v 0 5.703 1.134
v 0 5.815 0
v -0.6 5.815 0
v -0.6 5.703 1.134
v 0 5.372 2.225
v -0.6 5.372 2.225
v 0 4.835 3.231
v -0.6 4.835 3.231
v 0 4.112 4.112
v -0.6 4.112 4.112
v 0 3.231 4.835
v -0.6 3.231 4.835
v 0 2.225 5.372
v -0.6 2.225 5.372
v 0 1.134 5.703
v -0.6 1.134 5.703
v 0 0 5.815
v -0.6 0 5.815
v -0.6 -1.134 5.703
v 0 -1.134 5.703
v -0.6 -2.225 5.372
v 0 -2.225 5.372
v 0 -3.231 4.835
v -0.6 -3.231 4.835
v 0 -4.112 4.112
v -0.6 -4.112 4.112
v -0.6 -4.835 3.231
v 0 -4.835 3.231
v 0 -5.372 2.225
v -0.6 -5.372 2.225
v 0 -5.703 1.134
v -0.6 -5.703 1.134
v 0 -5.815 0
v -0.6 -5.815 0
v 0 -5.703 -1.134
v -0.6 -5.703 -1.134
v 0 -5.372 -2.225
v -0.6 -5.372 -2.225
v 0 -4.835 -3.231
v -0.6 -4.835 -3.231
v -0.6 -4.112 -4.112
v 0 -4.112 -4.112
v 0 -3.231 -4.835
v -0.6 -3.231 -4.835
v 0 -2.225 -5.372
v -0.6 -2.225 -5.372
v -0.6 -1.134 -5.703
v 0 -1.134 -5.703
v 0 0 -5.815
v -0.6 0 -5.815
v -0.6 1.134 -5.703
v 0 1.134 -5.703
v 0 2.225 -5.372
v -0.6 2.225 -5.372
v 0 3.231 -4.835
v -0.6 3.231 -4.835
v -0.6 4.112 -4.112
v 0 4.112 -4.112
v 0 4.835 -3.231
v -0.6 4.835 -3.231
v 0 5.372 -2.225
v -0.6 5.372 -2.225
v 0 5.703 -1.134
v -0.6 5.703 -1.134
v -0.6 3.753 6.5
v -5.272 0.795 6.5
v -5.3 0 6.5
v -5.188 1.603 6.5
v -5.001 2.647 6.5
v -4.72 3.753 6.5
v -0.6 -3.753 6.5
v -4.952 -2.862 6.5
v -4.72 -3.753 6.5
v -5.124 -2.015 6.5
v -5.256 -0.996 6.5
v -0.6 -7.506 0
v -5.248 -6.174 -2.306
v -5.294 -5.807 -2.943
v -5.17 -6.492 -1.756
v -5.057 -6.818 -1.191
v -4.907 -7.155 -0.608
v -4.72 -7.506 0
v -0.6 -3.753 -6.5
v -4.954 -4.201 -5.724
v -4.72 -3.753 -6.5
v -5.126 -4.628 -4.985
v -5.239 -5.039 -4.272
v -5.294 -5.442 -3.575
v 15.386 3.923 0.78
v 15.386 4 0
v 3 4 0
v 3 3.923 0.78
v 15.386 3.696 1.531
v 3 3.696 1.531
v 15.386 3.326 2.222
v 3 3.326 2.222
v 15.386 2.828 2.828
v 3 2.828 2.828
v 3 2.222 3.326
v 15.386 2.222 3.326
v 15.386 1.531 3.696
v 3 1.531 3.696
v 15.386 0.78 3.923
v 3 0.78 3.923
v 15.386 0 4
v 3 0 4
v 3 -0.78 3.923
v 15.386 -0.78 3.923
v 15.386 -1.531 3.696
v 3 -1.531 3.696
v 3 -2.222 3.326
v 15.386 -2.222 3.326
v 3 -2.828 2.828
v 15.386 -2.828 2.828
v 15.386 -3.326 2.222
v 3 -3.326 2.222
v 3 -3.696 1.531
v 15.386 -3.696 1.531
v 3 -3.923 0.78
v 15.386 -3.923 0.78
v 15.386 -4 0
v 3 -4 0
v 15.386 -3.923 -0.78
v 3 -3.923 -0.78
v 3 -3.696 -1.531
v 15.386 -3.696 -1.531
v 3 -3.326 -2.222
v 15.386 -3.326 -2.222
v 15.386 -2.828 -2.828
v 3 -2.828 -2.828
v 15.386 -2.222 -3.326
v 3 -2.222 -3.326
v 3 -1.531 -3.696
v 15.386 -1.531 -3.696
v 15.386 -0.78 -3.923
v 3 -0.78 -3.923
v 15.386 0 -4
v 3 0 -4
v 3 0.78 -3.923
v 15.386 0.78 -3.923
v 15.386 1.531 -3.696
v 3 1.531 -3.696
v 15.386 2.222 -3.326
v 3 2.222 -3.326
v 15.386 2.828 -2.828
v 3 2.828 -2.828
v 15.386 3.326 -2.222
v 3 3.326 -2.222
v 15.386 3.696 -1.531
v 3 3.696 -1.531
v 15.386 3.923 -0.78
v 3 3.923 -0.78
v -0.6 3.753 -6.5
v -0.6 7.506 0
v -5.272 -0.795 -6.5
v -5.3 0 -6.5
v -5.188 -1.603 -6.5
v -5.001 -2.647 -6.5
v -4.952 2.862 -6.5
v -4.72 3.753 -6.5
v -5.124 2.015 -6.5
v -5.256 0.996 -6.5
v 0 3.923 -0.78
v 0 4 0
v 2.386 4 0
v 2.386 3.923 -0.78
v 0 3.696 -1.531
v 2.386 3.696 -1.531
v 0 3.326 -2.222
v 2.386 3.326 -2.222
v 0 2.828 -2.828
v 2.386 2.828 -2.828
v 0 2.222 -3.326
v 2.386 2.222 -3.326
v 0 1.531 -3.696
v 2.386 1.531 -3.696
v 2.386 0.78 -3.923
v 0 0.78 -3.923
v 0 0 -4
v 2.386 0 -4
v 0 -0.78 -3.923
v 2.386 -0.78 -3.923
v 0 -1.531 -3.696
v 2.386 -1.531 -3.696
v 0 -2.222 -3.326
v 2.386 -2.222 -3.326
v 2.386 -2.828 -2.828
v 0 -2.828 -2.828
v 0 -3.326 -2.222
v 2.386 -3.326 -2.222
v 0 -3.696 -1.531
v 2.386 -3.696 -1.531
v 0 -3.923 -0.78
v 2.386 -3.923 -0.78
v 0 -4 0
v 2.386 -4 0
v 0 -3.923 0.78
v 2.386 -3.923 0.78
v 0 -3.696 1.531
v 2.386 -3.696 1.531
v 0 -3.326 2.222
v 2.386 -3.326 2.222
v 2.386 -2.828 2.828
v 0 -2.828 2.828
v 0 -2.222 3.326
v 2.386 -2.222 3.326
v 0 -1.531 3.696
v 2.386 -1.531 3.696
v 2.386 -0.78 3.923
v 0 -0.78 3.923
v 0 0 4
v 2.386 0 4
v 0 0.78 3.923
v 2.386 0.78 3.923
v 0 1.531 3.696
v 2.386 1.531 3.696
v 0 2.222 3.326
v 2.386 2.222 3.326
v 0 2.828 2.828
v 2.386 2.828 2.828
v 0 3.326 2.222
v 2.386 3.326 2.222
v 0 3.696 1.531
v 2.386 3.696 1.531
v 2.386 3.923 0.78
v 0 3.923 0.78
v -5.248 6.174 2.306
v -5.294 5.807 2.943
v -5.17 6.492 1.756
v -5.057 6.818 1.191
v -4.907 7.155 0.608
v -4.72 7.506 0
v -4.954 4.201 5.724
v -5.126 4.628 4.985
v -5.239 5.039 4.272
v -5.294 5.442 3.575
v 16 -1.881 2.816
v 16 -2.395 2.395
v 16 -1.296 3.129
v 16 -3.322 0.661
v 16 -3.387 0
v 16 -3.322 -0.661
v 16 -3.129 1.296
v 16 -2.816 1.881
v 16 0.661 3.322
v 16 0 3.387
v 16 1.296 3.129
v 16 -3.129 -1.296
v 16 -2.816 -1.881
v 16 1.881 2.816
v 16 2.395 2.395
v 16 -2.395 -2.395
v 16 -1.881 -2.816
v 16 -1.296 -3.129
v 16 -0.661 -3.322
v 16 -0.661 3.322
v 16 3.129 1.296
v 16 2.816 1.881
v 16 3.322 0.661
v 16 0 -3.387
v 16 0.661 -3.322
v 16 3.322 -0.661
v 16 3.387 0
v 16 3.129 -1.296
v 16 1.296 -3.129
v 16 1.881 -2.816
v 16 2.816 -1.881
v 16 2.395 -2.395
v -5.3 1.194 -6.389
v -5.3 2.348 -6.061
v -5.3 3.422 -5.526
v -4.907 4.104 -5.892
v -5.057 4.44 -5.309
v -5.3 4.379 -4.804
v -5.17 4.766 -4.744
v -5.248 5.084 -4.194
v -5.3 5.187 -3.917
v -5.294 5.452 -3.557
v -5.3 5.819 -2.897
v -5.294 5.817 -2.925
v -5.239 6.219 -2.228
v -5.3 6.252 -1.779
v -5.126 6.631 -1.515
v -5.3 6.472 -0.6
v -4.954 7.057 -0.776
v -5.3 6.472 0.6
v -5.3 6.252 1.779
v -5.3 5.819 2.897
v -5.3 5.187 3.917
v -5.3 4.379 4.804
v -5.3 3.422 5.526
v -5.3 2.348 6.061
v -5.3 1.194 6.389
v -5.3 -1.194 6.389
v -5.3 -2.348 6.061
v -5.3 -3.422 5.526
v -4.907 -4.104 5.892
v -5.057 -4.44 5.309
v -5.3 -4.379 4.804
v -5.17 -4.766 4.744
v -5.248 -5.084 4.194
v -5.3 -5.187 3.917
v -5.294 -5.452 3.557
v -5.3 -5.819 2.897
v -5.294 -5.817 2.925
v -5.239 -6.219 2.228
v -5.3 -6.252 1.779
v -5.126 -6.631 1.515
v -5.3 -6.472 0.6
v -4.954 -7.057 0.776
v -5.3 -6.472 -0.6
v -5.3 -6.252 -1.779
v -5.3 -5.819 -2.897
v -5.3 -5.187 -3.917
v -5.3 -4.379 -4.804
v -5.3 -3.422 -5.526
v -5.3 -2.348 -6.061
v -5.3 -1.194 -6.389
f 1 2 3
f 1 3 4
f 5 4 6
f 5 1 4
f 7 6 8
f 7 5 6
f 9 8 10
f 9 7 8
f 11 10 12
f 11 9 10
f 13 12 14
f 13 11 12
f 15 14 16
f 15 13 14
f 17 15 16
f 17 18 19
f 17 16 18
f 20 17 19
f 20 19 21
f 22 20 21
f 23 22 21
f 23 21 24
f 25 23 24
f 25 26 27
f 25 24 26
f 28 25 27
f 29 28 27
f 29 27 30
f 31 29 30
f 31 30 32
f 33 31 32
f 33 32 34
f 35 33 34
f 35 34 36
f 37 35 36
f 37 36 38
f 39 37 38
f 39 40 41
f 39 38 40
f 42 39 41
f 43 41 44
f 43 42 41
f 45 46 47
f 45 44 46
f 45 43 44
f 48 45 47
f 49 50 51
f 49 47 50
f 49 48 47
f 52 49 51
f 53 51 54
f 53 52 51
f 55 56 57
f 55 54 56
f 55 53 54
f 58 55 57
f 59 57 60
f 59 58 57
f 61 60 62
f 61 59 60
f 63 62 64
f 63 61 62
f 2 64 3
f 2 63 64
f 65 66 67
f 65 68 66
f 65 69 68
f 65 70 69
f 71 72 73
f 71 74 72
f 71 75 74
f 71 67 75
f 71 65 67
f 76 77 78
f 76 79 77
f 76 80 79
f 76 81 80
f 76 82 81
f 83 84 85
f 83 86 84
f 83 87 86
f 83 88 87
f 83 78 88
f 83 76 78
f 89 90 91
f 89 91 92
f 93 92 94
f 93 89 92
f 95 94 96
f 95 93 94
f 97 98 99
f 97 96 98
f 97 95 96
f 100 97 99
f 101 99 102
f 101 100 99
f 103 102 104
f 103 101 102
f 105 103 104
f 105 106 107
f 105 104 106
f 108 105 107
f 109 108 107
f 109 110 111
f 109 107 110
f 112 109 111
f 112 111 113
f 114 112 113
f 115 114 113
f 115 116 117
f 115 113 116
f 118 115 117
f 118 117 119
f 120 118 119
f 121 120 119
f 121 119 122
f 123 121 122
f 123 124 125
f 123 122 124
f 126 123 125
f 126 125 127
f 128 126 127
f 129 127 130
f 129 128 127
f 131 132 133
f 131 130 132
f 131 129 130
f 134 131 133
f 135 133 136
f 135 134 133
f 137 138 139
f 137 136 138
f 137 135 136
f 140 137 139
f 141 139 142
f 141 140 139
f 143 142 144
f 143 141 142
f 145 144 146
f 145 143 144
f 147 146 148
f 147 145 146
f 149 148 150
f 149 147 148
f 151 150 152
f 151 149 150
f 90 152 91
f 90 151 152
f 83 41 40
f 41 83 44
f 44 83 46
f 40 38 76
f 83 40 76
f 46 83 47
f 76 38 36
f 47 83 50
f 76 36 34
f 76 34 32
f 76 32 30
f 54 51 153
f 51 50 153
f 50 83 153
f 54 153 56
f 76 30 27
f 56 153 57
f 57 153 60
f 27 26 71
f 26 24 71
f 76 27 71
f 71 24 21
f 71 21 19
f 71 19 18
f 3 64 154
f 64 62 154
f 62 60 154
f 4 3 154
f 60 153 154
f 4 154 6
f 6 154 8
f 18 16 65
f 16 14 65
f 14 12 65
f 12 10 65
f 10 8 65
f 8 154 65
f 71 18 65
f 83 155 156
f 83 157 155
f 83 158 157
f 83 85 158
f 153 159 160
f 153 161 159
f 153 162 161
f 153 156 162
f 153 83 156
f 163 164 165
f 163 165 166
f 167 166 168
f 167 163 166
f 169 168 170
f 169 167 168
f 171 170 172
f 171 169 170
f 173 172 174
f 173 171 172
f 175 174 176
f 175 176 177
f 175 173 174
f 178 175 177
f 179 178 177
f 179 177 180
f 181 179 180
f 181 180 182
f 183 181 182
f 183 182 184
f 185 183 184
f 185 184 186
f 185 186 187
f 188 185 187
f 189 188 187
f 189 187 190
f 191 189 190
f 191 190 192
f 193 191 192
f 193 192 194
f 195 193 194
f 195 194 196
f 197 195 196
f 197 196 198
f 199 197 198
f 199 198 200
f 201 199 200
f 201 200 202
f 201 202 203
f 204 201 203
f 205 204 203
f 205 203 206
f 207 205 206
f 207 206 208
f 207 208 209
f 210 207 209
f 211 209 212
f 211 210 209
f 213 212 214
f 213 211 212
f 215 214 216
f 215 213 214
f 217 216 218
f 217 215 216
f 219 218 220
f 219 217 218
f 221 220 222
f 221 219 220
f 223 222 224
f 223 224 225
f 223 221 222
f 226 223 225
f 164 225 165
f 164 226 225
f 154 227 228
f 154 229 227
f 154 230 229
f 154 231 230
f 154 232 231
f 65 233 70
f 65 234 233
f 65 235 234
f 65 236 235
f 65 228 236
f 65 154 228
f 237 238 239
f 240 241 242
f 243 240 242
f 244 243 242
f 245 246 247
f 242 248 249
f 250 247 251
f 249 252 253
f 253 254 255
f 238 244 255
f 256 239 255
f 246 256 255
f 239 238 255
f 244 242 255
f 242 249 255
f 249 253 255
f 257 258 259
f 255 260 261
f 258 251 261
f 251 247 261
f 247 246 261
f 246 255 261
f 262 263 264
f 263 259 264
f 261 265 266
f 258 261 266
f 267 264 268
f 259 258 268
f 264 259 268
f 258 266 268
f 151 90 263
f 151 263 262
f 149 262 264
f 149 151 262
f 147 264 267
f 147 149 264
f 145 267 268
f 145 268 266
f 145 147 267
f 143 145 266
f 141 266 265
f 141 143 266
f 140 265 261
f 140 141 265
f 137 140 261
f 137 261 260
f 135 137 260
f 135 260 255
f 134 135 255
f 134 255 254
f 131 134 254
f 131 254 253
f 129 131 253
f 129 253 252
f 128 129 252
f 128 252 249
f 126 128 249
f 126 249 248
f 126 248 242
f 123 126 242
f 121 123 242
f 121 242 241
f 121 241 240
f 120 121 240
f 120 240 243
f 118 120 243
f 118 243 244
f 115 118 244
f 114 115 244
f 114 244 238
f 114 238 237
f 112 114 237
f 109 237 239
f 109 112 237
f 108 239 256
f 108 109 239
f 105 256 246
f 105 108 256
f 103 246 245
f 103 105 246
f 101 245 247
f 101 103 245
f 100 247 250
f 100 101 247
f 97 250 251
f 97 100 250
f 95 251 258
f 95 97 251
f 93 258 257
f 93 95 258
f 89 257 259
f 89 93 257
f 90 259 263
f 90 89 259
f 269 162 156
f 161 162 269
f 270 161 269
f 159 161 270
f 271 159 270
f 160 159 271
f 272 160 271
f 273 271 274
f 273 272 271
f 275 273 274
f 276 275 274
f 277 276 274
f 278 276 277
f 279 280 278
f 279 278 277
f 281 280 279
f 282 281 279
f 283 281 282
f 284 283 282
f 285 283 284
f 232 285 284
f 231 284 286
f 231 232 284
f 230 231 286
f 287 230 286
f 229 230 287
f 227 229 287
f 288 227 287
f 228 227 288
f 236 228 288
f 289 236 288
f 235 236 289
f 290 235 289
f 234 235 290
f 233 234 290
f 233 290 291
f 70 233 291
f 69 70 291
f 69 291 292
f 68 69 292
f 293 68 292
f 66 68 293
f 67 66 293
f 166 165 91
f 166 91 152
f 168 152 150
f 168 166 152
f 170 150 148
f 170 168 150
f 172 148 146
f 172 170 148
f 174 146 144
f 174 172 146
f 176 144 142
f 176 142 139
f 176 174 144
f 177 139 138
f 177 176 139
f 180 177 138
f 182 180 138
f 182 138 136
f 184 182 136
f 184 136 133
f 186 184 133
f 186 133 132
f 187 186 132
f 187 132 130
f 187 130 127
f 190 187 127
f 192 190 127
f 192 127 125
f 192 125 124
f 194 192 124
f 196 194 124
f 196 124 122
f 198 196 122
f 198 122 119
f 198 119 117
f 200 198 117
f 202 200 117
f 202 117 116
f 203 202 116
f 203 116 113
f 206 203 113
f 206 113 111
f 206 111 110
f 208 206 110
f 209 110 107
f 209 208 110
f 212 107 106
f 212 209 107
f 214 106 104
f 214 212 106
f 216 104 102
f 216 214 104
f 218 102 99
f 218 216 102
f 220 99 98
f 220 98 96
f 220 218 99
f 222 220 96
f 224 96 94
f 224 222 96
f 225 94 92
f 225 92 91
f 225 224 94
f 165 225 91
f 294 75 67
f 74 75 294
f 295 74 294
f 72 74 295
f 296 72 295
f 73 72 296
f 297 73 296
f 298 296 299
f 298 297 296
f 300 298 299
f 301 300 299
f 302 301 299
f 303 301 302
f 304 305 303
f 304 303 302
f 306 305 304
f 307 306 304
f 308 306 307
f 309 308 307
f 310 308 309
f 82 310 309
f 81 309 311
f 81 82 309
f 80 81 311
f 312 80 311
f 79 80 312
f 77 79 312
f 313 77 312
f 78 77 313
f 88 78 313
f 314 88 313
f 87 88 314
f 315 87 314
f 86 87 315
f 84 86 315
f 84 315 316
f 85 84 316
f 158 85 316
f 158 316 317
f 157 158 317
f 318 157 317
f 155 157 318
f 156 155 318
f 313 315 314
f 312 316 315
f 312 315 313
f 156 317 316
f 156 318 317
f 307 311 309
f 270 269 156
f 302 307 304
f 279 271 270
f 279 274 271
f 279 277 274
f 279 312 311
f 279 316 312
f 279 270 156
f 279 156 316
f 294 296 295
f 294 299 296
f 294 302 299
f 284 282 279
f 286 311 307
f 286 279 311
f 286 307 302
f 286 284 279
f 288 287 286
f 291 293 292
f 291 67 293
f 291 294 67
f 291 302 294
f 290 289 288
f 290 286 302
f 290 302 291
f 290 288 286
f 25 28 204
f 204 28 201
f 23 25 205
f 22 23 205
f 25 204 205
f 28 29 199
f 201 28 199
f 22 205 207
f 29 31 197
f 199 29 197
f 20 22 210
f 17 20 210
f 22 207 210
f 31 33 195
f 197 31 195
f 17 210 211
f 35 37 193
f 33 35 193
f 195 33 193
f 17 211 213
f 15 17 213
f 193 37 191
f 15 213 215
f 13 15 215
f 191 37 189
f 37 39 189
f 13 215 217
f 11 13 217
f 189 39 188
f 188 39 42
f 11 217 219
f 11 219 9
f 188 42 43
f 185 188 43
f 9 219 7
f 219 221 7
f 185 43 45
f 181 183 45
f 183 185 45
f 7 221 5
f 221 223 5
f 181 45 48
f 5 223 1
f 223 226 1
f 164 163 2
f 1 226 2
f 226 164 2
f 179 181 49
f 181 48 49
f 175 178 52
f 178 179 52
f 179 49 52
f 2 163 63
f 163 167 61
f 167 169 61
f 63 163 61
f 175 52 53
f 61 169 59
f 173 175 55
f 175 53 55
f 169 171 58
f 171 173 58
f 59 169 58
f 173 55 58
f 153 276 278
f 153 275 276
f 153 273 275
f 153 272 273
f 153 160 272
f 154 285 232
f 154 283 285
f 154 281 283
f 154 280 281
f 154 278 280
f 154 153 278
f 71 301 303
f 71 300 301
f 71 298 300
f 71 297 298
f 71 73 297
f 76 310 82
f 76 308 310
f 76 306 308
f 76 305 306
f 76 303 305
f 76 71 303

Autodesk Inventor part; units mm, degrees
ref_plane "YZ Plane" through (0, 0, 0) normal (1, 0, 0) x (0, 1, 0)
ref_plane "XZ Plane" through (0, 0, 0) normal (0, 1, 0) x (-1, 0, 0)
sketch "Sketch1" plane through (0, 0, 0) normal (0, 0, 1) x (1, 0, 0)
  line L0 (0, 5.815) -> (0, 4)
  line L1 (3, 4) -> (16, 4)
  line L2 (16, 4) -> (16, 0)
  line L3 (16, 0) -> (-0.6001, 0)
  line L4 (-3.9201, 0) -> (19.32, 0) projected
  line L5 (-0.6001, 0) -> (-0.6001, 5.815)
  line L6 (-0.6001, 5.815) -> (0, 5.815)
  line L7 (3, 4) -> (2.3865, 4)
  line L8 (2.3865, 4) -> (0, 4)
  line L9 (0, -1.163) -> (0, 6.978) projected
  dimension "d0" = 16
  dimension "d1" = 13
  dimension "d2" = 8
  dimension "d9" = 0.6001
  dimension "d10" = 11.63
  dimension "d13" = 0.6136
  dimension "d14" = 8
revolve "Body" add sketch "Sketch1" angle 360 about axis through (16, 0, 0) along (-1, 0, 0)
sketch "Sketch2" plane through (-0.6001, 0, 0) normal (-1, 0, 0) x (0, 0, 1)
  line L0 (0, 7.5056) -> (6.5, 3.7528)
  line L1 (6.5, 3.7528) -> (6.5, -3.7528)
  line L2 (6.5, -3.7528) -> (0, -7.5056)
  line L3 (0, -7.5056) -> (-6.5, -3.7528)
  line L4 (-6.5, -3.7528) -> (-6.5, 3.7528)
  line L5 (-6.5, 3.7528) -> (0, 7.5056)
  point P0 (0, 0)
  point P1 (0, 0)
  dimension "d11" = 13
extrude "Head" add sketch "Sketch2" along normal blind 4.7
sketch "Sketch4" plane through (0, 0, 0) normal (0, 0, 1) x (1, 0, 0)
  line L0 (-5.3001, 6.5) -> (-5.3001, 7.5056)
  line L1 (-5.3001, 7.5056) -> (-4.7195, 7.5056)
  line L2 (-4.7195, 7.5056) -> (-5.3001, 6.5)
  line L3 (-6.2401, 0) -> (0.3399, 0) projected
  line L4 (-0.6001, 7.5056) -> (-5.3001, 7.5056) projected
  line L5 (-5.3001, 3.7528) -> (-5.3001, 7.5056) projected
  dimension "d5" = 30
  dimension "d19" = 13
revolve "Chamfer1" cut sketch "Sketch4" angle 360 about axis through (-10, 0, 0) along (1, 0, 0)
thread "Thread" size "M8x1" class "6g" standard "ISO Metric profile" length 13
chamfer "Chamfer2" distance 0.6134 distance2 0.6136 1 edges at (16, -4, 0) measured on face at (16, -0.6859, -0.8072)
ref_plane "Work Plane1" through (1.525, 0, 0) normal (0, 0, 1) x (1, 0, 0)
equation "\"d0\" = NLG"
equation "\"d1\" = GEL"
equation "\"d2\" = GD"
equation "\"d10\" = SD2"
equation "\"d14\" = BDM"
equation "\"d11\" = SW"
equation "\"d3\" = KOH - SD"
equation "\"d5\" = ANG1"
equation "\"d19\" = SW0"
equation "\"d15\" = GEL"
equation "\"d6\" = -0.5 * SPD + 0.5 * GD"
equation "\"NLG\" = 16"
equation "\"GD\" = NND"
equation "\"BDM\" = NND"
equation "\"KOH\" = 5.3"
equation "\"GEL\" = 13"
equation "\"SW\" = 13"
equation "\"SW0\" = 13"
equation "\"SPD\" = NND - 1.2269 * PTC"
equation "\"SD2\" = 11.63"
equation "\"SD\" = 0.6"
equation "\"ANG1\" = 30deg"
equation "\"GAL\" = 0.61345 * PTC"
equation "\"GUL\" = 0.61345 * PTC"
equation "\"RR\" = 0.4"
equation "\"GD1\" = THREADDIA - 1.2269 * PTC"
equation "\"THREADDIA\" = 8"
equation "\"SDH\" = SD2"
equation "\"TOA\" = 30deg"
equation "\"PTC\" = 1"
equation "\"NND\" = 8"
equation "\"E0\" = 1.155 * SW"
properties part number "ISO 8676 - M8 x 1 x 16(3)" material "Stainless Steel, 440C"
